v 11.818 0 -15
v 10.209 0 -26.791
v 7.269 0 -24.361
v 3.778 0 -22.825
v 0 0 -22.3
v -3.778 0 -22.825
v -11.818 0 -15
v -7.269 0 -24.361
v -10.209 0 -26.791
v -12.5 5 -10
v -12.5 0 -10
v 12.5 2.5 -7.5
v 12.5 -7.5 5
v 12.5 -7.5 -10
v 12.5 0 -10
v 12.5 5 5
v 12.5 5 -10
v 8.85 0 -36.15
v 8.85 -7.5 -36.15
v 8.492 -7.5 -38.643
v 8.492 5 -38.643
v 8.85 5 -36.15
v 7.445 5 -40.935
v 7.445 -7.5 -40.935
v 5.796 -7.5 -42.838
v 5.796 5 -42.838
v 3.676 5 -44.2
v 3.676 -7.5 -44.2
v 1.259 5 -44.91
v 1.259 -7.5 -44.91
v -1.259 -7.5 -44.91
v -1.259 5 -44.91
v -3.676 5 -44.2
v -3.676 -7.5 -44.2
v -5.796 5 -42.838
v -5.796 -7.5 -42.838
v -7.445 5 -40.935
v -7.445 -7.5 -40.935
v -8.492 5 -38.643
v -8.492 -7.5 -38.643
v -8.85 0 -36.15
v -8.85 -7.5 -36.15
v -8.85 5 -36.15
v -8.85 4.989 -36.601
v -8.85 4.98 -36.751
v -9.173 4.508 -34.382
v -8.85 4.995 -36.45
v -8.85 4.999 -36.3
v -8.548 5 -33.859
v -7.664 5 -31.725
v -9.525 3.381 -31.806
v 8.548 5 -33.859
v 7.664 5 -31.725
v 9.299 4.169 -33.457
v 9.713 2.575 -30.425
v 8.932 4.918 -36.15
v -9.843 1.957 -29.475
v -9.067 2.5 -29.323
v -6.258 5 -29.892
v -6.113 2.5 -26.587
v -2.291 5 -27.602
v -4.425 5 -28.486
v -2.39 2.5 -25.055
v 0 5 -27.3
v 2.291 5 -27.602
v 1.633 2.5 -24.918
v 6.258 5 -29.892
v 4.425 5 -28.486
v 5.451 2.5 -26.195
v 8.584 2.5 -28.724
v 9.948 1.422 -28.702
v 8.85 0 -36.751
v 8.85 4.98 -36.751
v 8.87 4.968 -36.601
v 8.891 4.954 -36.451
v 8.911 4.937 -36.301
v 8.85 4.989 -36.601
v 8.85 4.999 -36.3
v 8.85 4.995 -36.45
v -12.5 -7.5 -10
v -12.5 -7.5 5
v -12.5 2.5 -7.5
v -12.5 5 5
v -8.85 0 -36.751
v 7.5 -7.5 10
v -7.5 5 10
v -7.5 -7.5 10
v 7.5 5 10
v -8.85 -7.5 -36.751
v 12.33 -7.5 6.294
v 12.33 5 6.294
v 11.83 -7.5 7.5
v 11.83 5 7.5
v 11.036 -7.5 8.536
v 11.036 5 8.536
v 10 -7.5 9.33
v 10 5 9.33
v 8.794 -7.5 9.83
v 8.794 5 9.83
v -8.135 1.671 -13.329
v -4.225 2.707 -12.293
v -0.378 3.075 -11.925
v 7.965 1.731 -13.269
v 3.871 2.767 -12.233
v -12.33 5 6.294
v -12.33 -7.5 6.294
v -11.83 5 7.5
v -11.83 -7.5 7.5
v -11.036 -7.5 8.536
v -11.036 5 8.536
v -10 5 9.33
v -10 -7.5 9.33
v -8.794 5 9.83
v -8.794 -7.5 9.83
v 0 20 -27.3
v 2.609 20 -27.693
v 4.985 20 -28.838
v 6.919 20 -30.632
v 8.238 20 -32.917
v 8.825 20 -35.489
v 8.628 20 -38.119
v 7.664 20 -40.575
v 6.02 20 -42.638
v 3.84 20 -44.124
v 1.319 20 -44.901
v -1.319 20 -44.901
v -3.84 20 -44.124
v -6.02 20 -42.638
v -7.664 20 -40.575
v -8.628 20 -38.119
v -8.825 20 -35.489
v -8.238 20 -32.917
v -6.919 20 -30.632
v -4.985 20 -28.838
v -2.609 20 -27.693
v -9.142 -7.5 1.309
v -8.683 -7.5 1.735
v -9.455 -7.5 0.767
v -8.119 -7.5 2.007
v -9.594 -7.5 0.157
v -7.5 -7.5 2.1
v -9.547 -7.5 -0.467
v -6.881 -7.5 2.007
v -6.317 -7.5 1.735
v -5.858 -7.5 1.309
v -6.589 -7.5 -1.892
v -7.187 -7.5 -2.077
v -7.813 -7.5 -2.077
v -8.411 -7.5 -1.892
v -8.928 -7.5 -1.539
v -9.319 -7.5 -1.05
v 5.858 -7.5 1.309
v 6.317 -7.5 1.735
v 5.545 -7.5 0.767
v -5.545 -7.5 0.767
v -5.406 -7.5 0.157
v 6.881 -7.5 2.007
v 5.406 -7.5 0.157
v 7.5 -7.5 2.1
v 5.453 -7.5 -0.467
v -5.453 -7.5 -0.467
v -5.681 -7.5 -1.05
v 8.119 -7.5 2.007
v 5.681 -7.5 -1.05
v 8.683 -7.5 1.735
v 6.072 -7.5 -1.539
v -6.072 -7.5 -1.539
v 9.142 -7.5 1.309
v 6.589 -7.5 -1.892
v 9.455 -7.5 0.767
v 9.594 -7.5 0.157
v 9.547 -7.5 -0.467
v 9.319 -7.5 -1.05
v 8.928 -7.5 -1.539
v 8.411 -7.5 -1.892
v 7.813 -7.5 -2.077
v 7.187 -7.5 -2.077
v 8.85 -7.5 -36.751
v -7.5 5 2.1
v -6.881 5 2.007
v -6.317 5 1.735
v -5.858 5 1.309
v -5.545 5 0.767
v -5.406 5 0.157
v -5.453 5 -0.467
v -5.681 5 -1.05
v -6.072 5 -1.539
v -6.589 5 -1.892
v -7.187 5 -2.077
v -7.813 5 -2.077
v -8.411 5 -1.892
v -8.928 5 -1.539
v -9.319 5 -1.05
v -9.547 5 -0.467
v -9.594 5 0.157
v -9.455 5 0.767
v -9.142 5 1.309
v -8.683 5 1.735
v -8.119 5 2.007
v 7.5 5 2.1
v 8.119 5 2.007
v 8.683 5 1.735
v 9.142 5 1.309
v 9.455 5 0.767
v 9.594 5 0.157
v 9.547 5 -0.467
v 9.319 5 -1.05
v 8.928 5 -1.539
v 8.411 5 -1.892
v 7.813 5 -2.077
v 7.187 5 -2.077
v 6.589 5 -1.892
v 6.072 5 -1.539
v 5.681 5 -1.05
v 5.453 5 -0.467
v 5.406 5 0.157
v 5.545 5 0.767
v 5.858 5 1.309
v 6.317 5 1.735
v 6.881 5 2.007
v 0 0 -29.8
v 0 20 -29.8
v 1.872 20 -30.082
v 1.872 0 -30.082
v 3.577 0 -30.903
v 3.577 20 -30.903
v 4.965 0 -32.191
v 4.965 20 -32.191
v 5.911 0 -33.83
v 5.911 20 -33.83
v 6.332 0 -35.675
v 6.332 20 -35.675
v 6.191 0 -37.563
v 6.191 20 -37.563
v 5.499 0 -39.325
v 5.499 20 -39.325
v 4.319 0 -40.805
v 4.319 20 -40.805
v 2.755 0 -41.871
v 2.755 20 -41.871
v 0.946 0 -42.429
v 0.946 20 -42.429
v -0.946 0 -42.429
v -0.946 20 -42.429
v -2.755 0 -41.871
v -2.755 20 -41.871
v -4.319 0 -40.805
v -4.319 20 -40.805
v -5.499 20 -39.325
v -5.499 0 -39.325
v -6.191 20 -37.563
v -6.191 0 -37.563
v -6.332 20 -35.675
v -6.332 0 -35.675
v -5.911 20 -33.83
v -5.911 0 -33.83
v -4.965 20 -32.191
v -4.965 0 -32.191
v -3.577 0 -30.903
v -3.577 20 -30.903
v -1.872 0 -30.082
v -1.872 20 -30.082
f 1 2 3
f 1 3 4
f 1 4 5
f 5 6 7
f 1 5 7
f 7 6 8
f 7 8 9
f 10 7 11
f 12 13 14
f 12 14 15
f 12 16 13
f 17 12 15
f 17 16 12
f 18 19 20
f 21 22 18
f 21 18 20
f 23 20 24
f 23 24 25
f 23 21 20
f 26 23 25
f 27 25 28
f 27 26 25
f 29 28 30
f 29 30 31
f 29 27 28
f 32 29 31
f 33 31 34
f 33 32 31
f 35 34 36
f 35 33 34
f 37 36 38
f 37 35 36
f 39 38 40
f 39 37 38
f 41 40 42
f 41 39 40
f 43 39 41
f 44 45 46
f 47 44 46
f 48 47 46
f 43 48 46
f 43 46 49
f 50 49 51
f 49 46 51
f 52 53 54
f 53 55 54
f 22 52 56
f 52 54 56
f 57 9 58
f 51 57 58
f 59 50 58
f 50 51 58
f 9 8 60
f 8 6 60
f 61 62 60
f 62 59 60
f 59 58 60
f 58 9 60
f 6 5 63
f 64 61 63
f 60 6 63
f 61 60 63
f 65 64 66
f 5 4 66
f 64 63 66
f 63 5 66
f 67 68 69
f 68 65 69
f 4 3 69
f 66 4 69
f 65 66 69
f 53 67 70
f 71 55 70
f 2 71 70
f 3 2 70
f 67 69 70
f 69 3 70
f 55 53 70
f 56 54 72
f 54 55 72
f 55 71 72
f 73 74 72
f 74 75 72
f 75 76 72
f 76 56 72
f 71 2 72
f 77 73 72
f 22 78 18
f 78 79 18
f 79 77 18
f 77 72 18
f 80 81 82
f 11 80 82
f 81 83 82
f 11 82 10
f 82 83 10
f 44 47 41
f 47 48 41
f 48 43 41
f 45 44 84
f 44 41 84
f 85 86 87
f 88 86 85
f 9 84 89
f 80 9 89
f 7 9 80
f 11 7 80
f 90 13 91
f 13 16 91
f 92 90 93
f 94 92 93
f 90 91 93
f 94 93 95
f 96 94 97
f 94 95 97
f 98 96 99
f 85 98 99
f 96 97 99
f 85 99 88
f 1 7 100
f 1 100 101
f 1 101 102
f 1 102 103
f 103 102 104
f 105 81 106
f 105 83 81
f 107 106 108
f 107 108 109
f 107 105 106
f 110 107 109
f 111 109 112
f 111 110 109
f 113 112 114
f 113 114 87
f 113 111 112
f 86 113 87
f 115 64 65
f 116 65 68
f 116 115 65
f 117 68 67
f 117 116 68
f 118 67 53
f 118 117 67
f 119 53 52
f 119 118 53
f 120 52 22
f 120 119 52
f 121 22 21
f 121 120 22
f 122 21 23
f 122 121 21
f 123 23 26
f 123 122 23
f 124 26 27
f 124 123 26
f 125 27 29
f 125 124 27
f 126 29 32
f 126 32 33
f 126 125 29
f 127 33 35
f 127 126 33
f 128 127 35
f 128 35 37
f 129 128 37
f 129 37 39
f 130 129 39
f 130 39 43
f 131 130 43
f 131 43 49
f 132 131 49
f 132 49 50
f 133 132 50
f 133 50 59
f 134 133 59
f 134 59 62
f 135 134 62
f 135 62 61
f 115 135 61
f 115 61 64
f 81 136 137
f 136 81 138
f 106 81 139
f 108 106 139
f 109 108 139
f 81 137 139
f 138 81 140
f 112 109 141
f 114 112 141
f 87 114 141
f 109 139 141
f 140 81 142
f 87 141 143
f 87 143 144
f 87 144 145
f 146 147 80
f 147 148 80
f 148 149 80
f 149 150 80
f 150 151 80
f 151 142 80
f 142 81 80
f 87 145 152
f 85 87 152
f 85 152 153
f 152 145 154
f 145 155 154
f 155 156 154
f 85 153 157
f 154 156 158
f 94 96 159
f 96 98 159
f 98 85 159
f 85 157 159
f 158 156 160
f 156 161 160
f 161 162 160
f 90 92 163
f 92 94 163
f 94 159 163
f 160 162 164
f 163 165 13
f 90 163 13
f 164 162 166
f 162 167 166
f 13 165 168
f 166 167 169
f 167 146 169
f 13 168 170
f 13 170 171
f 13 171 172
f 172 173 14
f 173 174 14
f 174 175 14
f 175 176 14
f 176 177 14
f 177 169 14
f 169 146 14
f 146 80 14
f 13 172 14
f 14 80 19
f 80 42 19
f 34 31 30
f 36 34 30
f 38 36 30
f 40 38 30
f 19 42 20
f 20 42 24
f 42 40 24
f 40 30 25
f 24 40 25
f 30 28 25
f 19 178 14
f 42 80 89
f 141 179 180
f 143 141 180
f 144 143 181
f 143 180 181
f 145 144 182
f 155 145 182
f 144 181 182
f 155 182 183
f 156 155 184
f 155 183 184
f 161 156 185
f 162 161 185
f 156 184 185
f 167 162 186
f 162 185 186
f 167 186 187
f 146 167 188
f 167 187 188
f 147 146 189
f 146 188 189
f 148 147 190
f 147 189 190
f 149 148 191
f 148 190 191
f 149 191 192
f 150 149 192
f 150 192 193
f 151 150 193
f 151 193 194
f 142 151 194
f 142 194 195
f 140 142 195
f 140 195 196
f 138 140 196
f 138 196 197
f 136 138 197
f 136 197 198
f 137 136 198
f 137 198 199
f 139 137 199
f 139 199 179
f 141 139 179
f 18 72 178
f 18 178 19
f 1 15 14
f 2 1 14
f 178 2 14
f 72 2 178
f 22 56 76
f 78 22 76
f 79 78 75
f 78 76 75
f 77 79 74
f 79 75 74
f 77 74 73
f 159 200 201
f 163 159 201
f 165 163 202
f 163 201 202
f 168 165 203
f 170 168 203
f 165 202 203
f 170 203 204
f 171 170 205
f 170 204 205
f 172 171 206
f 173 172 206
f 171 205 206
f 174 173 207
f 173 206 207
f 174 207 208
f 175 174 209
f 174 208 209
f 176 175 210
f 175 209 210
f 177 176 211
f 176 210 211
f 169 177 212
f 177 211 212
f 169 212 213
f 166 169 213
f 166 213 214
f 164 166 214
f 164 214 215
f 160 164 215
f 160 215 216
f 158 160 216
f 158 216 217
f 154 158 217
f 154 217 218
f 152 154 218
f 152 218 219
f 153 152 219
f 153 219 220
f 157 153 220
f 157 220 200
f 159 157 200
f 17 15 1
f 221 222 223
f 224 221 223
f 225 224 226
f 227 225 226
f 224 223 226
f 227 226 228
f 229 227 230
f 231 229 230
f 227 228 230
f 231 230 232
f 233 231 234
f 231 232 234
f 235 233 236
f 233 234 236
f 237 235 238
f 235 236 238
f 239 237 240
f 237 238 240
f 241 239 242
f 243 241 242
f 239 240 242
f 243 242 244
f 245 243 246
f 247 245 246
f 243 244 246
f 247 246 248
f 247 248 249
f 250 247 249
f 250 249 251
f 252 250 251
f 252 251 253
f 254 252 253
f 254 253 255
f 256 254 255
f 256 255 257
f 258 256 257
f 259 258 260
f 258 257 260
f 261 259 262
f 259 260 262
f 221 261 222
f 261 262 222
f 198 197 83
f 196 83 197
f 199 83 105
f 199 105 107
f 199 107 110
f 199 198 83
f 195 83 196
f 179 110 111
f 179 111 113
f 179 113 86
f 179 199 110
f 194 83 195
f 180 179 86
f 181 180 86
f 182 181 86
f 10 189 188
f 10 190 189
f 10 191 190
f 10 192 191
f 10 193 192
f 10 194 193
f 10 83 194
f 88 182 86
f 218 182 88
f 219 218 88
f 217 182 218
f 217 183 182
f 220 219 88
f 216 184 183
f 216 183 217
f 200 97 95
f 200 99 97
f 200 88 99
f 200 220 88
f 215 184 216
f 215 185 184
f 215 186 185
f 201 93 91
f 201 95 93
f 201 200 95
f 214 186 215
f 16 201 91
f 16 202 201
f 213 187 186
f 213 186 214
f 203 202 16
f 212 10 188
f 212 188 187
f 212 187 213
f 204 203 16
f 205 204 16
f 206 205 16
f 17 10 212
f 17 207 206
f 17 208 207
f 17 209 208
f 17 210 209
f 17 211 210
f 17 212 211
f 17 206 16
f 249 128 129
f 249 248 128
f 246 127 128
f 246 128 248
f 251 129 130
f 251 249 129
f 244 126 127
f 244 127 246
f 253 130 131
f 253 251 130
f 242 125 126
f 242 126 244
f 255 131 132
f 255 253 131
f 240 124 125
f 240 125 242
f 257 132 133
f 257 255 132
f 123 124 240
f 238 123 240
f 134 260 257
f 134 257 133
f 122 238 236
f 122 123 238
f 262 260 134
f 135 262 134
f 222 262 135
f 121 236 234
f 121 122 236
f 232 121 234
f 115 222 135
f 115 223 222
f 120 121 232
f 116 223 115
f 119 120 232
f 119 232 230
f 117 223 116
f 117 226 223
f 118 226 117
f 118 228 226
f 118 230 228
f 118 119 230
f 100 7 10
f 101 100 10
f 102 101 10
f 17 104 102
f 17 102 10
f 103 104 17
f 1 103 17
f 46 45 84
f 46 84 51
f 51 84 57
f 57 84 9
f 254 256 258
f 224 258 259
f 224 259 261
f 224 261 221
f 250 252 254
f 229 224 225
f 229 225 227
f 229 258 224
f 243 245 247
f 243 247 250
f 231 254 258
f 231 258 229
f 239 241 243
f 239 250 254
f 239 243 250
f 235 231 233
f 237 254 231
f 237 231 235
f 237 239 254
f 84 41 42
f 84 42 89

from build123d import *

# Parameters (mm, degrees)
SKETCH1_W           = 25
SKETCH1_H           = 20
SKETCH1_R           = 2.1
SKETCH1_R_2         = 8.85
SKETCH1_R_3         = 6.35
BOSS_EXTRUDE1_DEPTH = 7.5
BOSS_EXTRUDE2_START = 5
SKETCH1_3_W         = 25
SKETCH1_3_H         = 20
SKETCH1_3_R         = 2.1
BOSS_EXTRUDE2_DEPTH = 5
BOSS_EXTRUDE3_START = 20
SKETCH1_4_R         = 8.85
SKETCH1_4_R_2       = 6.35
BOSS_EXTRUDE3_DEPTH = 20
CHAMFER1_DEPTH      = 5
CHAMFER1_START      = 10.606601718
CHAMFER1_3_DEPTH    = 8.337218533
CHAMFER1_START_2    = 7.071067812
CHAMFER1_4_DEPTH    = 3.535533906
FILLET1_R           = 5


with BuildPart() as part:
    # Sketch1 → Boss-Extrude1 (new body)
    # profile 1 of 6: a face of its own
    with BuildSketch(Plane(origin=(0, 0, 0), x_dir=(1, 0, 0), z_dir=(0, 1, 0))):
        Rectangle(SKETCH1_W, SKETCH1_H)
        with Locations(Location((7.5, 0, 0), (0, 0, 270))):
            Circle(SKETCH1_R, mode=Mode.SUBTRACT)
        with Locations(Location((-7.5, 0, 0), (0, 0, 270))):
            Circle(SKETCH1_R, mode=Mode.SUBTRACT)
    # profile 2 of 6: a face of its own
    with BuildSketch(Plane(origin=(0, 0, 0), x_dir=(1, 0, 0), z_dir=(0, 1, 0))):
        with Locations((0, 36.15)):
            Circle(SKETCH1_R_2)
        with Locations((0, 36.15)):
            Circle(SKETCH1_R_3, mode=Mode.SUBTRACT)
    # profile 3 of 6: a face of its own
    with BuildSketch(Plane(origin=(0, 0, 0), x_dir=(1, 0, 0), z_dir=(0, 1, 0))):
        with BuildLine():
            Line((-8.85, 36.15), (-8.85, 10))
            Line((-8.85, 10), (8.85, 10))
            Line((8.85, 10), (8.85, 36.15))
            ThreePointArc((8.85, 36.15), (0, 27.3), (-8.85, 36.15))
        make_face()
    # profile 4 of 6: a face of its own
    with BuildSketch(Plane(origin=(0, 0, 0), x_dir=(1, 0, 0), z_dir=(0, 1, 0))):
        with Locations((0, 36.15)):
            Circle(SKETCH1_R_3)
    # profile 5 of 6: a face of its own
    with BuildSketch(Plane(origin=(0, 0, 0), x_dir=(1, 0, 0), z_dir=(0, 1, 0))):
        Polygon((-8.85, 36.75097877), (-12.5, 10), (-8.85, 10), (-8.85, 36.15), align=None)
    # profile 6 of 6: a face of its own
    with BuildSketch(Plane(origin=(0, 0, 0), x_dir=(1, 0, 0), z_dir=(0, 1, 0))):
        Polygon((8.85, 36.15), (8.85, 10), (12.5, 10), (8.85, 36.75097877), align=None)
    extrude(amount=-BOSS_EXTRUDE1_DEPTH)

    # Sketch1<3> → Boss-Extrude2 (add)
    with BuildSketch(Plane(origin=(0, 0, 0), x_dir=(1, 0, 0), z_dir=(0, 1, 0)).offset(BOSS_EXTRUDE2_START)):
        Rectangle(SKETCH1_3_W, SKETCH1_3_H)
        with Locations(Location((7.5, 0, 0), (0, 0, 270))):
            Circle(SKETCH1_3_R, mode=Mode.SUBTRACT)
        with Locations(Location((-7.5, 0, 0), (0, 0, 270))):
            Circle(SKETCH1_3_R, mode=Mode.SUBTRACT)
    extrude(amount=-BOSS_EXTRUDE2_DEPTH)

    # Sketch1<4> → Boss-Extrude3 (add)
    with BuildSketch(Plane(origin=(0, 0, 0), x_dir=(1, 0, 0), z_dir=(0, 1, 0)).offset(BOSS_EXTRUDE3_START)):
        with Locations(Location((0, 36.15, 0), (0, 0, 270))):
            Circle(SKETCH1_4_R)
        with Locations(Location((0, 36.15, 0), (0, 0, 270))):
            Circle(SKETCH1_4_R_2, mode=Mode.SUBTRACT)
    extrude(amount=-BOSS_EXTRUDE3_DEPTH)

    # Chamfer1: read off the stored shape, not the designer's step
    # Chamfer1 outline → Chamfer1 (add)
    with BuildSketch(Plane(origin=(0, 0, 0), x_dir=(1, 0, 0), z_dir=(0, 1, 0))):
        with BuildLine():
            Line((8.85, 36.75097877), (8.85, 36.15))
            ThreePointArc((8.85, 36.15), (0, 27.3), (-8.85, 36.15))
            Line((-8.85, 36.15), (-8.85, 36.75097877))
            Line((-8.85, 36.75097877), (-12.5, 10))
            Line((-12.5, 10), (12.5, 10))
            Line((12.5, 10), (8.85, 36.75097877))
        make_face()
    extrude(amount=CHAMFER1_DEPTH)

    # Chamfer1 2 outline → Chamfer1 2 (revolve, cut)
    with BuildSketch(Plane.XY.offset(-36.15)):
        Polygon((8.85, 5), (13.85, 0), (24.227721121, 0), (24.227721121, 5), align=None)
    revolve(axis=Axis((0, 0, -36.15), (0, 1, 0)), mode=Mode.SUBTRACT)

    # Chamfer1 3 outline → Chamfer1 3 (cut)
    with BuildSketch(Plane(origin=(0, 0, 0), x_dir=(1, 0, 0), z_dir=(0, 0.7071067811865516, -0.7071067811865436)).offset(CHAMFER1_START)):
        Polygon((11.817781971, 10.606601718), (-11.817781971, 10.606601718), (-12.5, 3.535533906), (12.5, 3.535533906), align=None)
    extrude(amount=CHAMFER1_3_DEPTH, mode=Mode.SUBTRACT)

    # Chamfer1 4 outline → Chamfer1 4 (add)
    with BuildSketch(Plane(origin=(0, 0, 0), x_dir=(1, 0, 0), z_dir=(0, 0.7071067811865516, -0.7071067811865436)).offset(CHAMFER1_START_2)):
        Polygon((11.817781971, 10.606601718), (-11.817781971, 10.606601718), (-12.5, 3.535533906), (12.5, 3.535533906), align=None)
    extrude(amount=CHAMFER1_4_DEPTH)

    # Fillet1
    fillet1_edges = [part.edges().sort_by_distance(p)[0] for p in [
        (12.5, -1.25, 10),
        (-12.5, -1.25, 10),
    ]]
    fillet(fillet1_edges, radius=FILLET1_R)


solid = part.part
